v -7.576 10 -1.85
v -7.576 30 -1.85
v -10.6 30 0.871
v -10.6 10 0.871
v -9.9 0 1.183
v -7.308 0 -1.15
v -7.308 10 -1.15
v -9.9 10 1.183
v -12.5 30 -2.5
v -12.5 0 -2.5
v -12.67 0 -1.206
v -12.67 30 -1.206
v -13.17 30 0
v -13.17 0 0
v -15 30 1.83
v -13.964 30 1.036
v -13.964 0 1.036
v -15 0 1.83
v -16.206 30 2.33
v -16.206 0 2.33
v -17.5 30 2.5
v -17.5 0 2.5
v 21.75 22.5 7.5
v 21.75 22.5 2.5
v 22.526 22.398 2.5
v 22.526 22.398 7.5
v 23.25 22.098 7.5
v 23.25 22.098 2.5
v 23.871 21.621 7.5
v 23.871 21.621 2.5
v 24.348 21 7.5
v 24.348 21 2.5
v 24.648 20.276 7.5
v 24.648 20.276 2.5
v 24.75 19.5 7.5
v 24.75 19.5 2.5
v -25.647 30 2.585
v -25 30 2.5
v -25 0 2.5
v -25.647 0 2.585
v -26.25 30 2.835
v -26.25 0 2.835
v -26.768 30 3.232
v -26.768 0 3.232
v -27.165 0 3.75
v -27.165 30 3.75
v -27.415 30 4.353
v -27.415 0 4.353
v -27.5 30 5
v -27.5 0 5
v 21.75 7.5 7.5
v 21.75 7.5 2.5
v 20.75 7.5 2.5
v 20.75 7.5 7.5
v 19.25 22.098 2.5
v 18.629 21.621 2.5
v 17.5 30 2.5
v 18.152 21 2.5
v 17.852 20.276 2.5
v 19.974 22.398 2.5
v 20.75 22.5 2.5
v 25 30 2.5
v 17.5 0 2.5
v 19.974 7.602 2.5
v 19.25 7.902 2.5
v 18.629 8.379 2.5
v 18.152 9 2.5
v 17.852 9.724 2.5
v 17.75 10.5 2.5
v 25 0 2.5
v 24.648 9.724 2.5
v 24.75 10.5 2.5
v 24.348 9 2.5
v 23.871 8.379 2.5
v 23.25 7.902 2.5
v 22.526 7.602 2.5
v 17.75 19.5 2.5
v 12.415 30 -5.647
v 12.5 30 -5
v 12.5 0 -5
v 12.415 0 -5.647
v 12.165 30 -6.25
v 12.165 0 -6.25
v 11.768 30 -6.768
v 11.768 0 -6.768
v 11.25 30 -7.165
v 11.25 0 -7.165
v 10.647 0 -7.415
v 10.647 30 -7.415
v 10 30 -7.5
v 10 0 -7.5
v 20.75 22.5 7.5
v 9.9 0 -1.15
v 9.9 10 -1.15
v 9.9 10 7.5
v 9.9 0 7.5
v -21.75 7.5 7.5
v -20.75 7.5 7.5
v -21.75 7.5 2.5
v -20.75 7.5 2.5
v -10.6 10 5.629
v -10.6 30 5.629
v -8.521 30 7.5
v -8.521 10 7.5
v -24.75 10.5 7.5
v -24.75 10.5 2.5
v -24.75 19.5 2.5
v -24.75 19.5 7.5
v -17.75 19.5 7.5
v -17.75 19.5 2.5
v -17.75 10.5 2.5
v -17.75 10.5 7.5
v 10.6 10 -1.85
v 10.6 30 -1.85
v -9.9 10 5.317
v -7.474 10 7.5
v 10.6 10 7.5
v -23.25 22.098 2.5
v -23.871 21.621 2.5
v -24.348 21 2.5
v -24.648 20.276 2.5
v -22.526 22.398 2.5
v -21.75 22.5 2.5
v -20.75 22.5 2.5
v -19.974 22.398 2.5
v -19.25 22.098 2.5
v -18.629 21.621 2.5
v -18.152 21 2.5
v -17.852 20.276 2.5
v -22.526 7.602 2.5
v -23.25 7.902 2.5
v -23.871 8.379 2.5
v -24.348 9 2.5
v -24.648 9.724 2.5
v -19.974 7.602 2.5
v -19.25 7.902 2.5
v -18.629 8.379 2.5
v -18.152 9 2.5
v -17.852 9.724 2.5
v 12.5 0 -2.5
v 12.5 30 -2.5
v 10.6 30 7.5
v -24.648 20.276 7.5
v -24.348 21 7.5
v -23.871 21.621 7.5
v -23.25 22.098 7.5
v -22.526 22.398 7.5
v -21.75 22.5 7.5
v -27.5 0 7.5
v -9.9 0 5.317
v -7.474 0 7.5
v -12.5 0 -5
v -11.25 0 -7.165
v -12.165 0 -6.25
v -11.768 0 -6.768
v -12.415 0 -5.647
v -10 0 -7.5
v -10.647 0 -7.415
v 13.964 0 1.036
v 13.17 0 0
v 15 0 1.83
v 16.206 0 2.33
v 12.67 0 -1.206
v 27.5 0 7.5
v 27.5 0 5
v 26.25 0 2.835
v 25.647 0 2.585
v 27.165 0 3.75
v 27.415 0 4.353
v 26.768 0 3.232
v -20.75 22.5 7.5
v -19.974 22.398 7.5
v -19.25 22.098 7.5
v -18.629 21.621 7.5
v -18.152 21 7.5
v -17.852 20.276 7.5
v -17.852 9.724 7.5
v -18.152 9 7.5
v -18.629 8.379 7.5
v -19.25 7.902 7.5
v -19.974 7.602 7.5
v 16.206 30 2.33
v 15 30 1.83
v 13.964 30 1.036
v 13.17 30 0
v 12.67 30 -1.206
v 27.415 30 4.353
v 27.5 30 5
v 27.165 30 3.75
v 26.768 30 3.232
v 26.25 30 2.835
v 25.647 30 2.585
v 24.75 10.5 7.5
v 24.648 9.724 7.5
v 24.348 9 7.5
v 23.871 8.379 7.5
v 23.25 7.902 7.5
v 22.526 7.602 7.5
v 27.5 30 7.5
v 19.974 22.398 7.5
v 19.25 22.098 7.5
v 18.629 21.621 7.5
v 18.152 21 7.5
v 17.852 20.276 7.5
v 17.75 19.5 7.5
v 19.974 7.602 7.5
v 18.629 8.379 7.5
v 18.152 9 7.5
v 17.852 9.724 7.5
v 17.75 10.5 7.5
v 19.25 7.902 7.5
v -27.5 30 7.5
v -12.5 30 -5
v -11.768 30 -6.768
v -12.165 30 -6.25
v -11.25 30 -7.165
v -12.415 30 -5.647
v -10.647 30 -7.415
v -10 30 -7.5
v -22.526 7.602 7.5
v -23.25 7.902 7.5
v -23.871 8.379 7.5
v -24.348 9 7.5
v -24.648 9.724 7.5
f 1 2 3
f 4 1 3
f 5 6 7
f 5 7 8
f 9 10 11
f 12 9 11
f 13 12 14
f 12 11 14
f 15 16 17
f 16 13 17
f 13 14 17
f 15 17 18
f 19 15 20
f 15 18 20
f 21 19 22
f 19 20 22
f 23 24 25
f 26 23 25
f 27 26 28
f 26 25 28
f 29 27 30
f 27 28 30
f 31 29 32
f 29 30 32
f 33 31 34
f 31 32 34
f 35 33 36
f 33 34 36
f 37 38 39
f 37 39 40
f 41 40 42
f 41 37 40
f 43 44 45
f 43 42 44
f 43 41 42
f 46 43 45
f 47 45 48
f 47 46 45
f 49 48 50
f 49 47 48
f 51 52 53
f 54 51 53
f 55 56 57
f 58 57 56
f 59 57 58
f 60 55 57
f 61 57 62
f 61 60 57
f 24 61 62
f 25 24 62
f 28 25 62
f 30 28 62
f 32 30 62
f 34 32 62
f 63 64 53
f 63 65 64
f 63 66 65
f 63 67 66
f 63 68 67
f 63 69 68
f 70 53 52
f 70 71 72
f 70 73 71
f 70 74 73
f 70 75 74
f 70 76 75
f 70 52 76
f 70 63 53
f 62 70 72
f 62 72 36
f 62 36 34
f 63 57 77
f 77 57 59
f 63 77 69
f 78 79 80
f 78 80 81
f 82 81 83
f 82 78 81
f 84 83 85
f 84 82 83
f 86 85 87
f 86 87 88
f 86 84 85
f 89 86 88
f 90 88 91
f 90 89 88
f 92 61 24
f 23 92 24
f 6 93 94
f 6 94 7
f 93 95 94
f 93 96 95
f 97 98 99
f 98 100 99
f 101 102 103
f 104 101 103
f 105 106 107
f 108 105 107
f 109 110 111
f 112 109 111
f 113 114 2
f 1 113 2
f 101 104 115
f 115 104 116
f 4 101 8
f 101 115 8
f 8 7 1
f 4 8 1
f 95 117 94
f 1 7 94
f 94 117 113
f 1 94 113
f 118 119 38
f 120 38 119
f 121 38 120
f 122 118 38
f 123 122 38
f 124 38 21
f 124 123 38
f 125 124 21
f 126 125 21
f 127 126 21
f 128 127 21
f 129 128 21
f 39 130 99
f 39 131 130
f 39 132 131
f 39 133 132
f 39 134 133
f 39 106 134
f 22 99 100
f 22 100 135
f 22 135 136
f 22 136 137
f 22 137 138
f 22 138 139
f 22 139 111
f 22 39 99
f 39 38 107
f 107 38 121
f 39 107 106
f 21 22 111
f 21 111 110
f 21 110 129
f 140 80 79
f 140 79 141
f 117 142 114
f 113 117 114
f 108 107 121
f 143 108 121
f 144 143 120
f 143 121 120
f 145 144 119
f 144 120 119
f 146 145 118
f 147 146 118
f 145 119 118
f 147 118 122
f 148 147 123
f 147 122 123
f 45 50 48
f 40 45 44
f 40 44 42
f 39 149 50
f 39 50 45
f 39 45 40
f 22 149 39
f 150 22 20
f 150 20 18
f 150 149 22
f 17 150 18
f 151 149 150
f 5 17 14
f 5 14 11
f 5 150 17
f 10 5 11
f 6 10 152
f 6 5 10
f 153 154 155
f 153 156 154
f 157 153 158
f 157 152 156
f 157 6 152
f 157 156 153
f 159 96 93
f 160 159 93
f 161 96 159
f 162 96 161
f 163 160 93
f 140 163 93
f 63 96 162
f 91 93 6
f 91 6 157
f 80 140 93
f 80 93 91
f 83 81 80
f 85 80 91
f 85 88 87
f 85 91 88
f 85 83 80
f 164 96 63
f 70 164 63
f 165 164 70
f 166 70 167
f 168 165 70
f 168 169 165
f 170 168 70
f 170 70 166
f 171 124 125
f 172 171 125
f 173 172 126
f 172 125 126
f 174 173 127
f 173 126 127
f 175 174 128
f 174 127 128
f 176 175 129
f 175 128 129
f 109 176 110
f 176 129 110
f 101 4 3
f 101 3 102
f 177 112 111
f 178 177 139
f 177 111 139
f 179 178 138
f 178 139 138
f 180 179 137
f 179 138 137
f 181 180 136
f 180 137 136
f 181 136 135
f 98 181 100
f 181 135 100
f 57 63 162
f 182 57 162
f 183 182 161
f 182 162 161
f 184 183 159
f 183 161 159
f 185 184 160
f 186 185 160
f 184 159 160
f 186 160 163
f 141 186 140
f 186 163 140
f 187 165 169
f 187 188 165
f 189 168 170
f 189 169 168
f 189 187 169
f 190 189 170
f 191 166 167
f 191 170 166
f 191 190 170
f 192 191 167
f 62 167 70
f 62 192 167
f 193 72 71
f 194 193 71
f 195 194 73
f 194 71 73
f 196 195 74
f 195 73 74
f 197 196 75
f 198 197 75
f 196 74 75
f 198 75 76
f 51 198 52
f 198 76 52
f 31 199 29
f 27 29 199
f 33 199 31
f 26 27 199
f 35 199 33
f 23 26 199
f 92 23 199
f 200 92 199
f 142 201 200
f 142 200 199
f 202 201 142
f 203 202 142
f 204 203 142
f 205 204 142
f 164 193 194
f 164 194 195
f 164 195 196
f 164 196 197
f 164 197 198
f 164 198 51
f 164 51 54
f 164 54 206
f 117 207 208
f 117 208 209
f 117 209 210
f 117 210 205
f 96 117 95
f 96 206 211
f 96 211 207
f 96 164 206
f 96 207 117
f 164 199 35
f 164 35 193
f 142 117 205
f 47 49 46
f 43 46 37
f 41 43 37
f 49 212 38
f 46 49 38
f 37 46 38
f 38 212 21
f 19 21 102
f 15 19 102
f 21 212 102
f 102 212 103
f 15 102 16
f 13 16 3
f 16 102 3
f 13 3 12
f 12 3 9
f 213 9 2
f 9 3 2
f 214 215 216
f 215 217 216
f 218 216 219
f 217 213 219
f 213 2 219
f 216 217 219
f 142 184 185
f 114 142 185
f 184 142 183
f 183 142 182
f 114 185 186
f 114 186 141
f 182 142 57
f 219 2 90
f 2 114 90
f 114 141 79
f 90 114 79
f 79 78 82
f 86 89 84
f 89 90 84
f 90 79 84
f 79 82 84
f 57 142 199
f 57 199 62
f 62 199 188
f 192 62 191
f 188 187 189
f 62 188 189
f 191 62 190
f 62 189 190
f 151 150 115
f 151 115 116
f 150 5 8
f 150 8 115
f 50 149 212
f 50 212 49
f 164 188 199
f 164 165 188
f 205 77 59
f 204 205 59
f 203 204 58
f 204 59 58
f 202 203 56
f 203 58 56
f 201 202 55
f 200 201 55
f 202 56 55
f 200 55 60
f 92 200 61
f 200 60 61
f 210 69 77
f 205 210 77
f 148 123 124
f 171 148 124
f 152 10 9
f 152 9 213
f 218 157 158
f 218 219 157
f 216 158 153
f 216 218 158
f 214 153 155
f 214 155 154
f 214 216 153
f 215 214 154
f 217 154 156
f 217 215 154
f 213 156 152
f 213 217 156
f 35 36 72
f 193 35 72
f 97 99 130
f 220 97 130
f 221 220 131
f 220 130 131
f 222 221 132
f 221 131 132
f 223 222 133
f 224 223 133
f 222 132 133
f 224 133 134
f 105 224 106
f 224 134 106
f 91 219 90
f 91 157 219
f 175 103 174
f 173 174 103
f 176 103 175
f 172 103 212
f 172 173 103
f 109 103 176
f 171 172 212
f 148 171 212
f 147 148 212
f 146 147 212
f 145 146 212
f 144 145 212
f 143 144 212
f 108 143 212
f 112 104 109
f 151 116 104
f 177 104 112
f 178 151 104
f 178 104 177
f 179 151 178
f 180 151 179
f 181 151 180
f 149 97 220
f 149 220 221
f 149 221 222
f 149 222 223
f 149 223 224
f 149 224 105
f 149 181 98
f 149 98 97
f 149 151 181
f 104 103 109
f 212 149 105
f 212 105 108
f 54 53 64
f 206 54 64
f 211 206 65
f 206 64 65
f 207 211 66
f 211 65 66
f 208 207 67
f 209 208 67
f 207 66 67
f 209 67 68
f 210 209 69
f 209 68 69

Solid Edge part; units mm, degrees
sketch "Sketch1" plane through (0, 0, 0) normal (0, -1, 0) x (1, 0, 0)
  line L0 (12.5, -7.5) -> (12.5, -2.5)
  arc A0 (17.5, 2.5) -> (12.5, -2.5) centre (17.5, -2.5) ccw
  line L1 (17.5, 2.5) -> (27.5, 2.5)
  line L2 (27.5, 2.5) -> (27.5, 7.5)
  line L3 (27.5, 7.5) -> (12.5, 7.5)
  line L4 (12.5, 7.5) -> (-12.5, 7.5)
  line L5 (-12.5, 7.5) -> (-27.5, 7.5)
  line L6 (-27.5, 7.5) -> (-27.5, 2.5)
  line L7 (-27.5, 2.5) -> (-17.5, 2.5)
  arc A1 (-17.5, 2.5) -> (-12.5, -2.5) centre (-17.5, -2.5) cw
  line L8 (-12.5, -2.5) -> (-12.5, -7.5)
  line L9 (-12.5, -7.5) -> (12.5, -7.5)
extrude "Protrusion1" add sketch "Sketch1" against normal blind 30
sketch "Sketch2" plane through (0, 0, 0) normal (0, -1, 0) x (1, 0, 0)
  line L0 (-9.9, 5.3168) -> (-7.4742, 7.5)
  line L1 (-7.25, 7.5) -> (-7.4742, 7.5)
  line L2 (-7.25, 7.5) -> (0, 7.5)
  line L3 (0, 7.5) -> (9.75, 7.5)
  line L4 (-7.4742, 7.5) -> (9.9, 7.5)
  line L5 (9.9, 7.5) -> (9.9, -1.15)
  line L6 (9.9, -1.15) -> (-7.3076, -1.15)
  line L7 (-7.3076, -1.15) -> (-9.9, 1.1832)
  line L8 (-9.9, 1.1832) -> (-9.9, 5.3168)
extrude "Cutout1" cut sketch "Sketch2" against normal blind 11 material side at (-8.6537, 0, 6.3712)
sketch "Sketch3" plane through (0, 30, 0) normal (0, 1, 0) x (-1, 0, 0)
  line L0 (-10.6, 7.5) -> (8.5206, 7.5)
  line L1 (10.6, 5.6286) -> (8.5206, 7.5)
  line L2 (10.6, 0.8714) -> (10.6, 5.6286)
  line L3 (7.5762, -1.85) -> (10.6, 0.8714)
  line L4 (-10.6, -1.85) -> (7.5762, -1.85)
  line L5 (-10.6, 7.5) -> (-10.6, -1.85)
extrude "Cutout2" cut sketch "Sketch3" against normal blind 20
fillet "Round1" radius 2.5 4 edges at (-27.5, 15, 2.5) (27.5, 15, 2.5) (12.5, 15, -7.5) (-12.5, 15, -7.5)
sketch "Sketch4" plane through (-21.25, 15, 2.5) normal (0, 0, -1) x (1, 0, 0)
  line L0 (-3.5, 4.5) -> (-3.5, -4.5)
  arc A0 (-3.5, -4.5) -> (-0.5, -7.5) centre (-0.5, -4.5) ccw
  line L1 (-0.5, -7.5) -> (0.5, -7.5)
  arc A1 (0.5, -7.5) -> (3.5, -4.5) centre (0.5, -4.5) ccw
  line L2 (3.5, -4.5) -> (3.5, 4.5)
  arc A2 (0.5, 7.5) -> (3.5, 4.5) centre (0.5, 4.5) cw
  line L3 (0.5, 7.5) -> (-0.5, 7.5)
  arc A3 (-0.5, 7.5) -> (-3.5, 4.5) centre (-0.5, 4.5) ccw
  line L4 (39, 4.5) -> (39, -4.5)
  arc A4 (42, -7.5) -> (39, -4.5) centre (42, -4.5) cw
  line L5 (42, -7.5) -> (43, -7.5)
  arc A5 (43, -7.5) -> (46, -4.5) centre (43, -4.5) ccw
  line L6 (46, -4.5) -> (46, 4.5)
  arc A6 (46, 4.5) -> (43, 7.5) centre (43, 4.5) ccw
  line L7 (43, 7.5) -> (42, 7.5)
  arc A7 (42, 7.5) -> (39, 4.5) centre (42, 4.5) ccw
  dimension "D1" = 15
  dimension "D2" = 7
  dimension "D3" = 0.25
  dimension "D4" = 0.25
  dimension "D5" = 7.5
  dimension "D6" = 15
  dimension "D7" = 7
  dimension "D8" = 0.25
  dimension "D9" = 7.5
extrude "Cutout3" cut sketch "Sketch4" against normal blind 10
